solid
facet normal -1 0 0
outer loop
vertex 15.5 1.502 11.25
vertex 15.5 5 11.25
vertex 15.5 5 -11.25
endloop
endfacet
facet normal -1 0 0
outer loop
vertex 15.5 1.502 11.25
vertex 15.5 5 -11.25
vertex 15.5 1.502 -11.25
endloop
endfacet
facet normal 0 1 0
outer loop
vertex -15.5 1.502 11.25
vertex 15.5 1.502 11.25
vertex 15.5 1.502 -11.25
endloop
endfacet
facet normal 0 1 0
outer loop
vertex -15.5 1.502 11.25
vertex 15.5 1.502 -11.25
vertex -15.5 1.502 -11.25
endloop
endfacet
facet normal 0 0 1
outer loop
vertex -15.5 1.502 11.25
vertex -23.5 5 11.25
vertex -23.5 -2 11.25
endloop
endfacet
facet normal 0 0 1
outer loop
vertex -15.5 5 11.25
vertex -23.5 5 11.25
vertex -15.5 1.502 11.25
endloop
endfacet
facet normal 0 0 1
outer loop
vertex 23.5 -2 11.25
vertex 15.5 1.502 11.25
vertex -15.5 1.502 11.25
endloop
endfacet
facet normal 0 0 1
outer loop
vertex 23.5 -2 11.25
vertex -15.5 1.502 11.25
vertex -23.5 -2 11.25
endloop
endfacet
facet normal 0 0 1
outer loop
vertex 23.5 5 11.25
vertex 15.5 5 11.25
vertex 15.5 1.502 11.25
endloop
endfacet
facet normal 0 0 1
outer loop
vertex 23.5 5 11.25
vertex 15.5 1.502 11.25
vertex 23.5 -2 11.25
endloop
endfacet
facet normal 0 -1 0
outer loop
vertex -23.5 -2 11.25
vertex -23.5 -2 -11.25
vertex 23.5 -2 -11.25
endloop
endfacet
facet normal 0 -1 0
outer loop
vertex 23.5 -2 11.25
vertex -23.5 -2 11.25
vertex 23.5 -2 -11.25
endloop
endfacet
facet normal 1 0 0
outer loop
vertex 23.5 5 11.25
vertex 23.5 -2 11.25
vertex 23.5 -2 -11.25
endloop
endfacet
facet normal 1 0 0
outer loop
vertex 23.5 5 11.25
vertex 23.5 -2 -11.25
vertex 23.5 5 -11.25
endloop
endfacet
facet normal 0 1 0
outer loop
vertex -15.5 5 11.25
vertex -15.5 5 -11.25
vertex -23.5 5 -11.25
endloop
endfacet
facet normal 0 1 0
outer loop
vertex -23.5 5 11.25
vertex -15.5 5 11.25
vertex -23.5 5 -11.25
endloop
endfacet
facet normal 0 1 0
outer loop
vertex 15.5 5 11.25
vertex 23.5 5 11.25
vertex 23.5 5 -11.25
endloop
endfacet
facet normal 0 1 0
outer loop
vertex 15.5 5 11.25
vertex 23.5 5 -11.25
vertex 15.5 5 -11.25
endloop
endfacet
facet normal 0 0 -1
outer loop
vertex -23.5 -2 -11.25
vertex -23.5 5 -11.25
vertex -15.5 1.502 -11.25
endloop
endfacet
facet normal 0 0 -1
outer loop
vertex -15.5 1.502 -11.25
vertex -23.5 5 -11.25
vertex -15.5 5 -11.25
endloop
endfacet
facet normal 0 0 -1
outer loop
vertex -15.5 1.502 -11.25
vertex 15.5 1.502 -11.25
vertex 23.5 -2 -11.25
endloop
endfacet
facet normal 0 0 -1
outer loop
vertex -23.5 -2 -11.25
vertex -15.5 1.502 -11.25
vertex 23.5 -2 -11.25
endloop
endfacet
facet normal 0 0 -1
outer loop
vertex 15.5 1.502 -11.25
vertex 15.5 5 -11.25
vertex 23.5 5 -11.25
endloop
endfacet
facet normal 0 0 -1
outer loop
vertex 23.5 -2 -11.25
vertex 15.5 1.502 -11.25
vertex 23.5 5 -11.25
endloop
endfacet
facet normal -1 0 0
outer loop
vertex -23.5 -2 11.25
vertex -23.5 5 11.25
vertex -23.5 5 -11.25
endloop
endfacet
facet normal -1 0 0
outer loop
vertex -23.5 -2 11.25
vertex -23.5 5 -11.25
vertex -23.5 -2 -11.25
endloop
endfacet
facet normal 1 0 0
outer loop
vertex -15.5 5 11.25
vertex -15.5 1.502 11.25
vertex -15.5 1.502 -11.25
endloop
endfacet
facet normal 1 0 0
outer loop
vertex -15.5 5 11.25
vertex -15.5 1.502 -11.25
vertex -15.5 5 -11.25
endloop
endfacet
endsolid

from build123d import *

# Parameters (mm, degrees)
SKETCH1_W           = 47
SKETCH1_H           = 22.5
BOSS_EXTRUDE1_DEPTH = 2
BOSS_EXTRUDE2_DEPTH = 22.5


with BuildPart() as part:
    # Sketch1 → Boss-Extrude1 (new body)
    with BuildSketch(Plane(origin=(0, 0, 0), x_dir=(1, 0, 0), z_dir=(0, 1, 0))):
        Rectangle(SKETCH1_W, SKETCH1_H)
    extrude(amount=-BOSS_EXTRUDE1_DEPTH)

    # Sketch2 → Boss-Extrude2 (add)
    with BuildSketch(Plane.XY.offset(11.25)):
        Polygon((-23.5, 0), (23.5, 0), (23.5, 5), (15.5, 5), (15.5, 1.501741003), (-15.5, 1.501741003), (-15.5, 5), (-23.5, 5), align=None)
    extrude(amount=-BOSS_EXTRUDE2_DEPTH)


solid = part.part
